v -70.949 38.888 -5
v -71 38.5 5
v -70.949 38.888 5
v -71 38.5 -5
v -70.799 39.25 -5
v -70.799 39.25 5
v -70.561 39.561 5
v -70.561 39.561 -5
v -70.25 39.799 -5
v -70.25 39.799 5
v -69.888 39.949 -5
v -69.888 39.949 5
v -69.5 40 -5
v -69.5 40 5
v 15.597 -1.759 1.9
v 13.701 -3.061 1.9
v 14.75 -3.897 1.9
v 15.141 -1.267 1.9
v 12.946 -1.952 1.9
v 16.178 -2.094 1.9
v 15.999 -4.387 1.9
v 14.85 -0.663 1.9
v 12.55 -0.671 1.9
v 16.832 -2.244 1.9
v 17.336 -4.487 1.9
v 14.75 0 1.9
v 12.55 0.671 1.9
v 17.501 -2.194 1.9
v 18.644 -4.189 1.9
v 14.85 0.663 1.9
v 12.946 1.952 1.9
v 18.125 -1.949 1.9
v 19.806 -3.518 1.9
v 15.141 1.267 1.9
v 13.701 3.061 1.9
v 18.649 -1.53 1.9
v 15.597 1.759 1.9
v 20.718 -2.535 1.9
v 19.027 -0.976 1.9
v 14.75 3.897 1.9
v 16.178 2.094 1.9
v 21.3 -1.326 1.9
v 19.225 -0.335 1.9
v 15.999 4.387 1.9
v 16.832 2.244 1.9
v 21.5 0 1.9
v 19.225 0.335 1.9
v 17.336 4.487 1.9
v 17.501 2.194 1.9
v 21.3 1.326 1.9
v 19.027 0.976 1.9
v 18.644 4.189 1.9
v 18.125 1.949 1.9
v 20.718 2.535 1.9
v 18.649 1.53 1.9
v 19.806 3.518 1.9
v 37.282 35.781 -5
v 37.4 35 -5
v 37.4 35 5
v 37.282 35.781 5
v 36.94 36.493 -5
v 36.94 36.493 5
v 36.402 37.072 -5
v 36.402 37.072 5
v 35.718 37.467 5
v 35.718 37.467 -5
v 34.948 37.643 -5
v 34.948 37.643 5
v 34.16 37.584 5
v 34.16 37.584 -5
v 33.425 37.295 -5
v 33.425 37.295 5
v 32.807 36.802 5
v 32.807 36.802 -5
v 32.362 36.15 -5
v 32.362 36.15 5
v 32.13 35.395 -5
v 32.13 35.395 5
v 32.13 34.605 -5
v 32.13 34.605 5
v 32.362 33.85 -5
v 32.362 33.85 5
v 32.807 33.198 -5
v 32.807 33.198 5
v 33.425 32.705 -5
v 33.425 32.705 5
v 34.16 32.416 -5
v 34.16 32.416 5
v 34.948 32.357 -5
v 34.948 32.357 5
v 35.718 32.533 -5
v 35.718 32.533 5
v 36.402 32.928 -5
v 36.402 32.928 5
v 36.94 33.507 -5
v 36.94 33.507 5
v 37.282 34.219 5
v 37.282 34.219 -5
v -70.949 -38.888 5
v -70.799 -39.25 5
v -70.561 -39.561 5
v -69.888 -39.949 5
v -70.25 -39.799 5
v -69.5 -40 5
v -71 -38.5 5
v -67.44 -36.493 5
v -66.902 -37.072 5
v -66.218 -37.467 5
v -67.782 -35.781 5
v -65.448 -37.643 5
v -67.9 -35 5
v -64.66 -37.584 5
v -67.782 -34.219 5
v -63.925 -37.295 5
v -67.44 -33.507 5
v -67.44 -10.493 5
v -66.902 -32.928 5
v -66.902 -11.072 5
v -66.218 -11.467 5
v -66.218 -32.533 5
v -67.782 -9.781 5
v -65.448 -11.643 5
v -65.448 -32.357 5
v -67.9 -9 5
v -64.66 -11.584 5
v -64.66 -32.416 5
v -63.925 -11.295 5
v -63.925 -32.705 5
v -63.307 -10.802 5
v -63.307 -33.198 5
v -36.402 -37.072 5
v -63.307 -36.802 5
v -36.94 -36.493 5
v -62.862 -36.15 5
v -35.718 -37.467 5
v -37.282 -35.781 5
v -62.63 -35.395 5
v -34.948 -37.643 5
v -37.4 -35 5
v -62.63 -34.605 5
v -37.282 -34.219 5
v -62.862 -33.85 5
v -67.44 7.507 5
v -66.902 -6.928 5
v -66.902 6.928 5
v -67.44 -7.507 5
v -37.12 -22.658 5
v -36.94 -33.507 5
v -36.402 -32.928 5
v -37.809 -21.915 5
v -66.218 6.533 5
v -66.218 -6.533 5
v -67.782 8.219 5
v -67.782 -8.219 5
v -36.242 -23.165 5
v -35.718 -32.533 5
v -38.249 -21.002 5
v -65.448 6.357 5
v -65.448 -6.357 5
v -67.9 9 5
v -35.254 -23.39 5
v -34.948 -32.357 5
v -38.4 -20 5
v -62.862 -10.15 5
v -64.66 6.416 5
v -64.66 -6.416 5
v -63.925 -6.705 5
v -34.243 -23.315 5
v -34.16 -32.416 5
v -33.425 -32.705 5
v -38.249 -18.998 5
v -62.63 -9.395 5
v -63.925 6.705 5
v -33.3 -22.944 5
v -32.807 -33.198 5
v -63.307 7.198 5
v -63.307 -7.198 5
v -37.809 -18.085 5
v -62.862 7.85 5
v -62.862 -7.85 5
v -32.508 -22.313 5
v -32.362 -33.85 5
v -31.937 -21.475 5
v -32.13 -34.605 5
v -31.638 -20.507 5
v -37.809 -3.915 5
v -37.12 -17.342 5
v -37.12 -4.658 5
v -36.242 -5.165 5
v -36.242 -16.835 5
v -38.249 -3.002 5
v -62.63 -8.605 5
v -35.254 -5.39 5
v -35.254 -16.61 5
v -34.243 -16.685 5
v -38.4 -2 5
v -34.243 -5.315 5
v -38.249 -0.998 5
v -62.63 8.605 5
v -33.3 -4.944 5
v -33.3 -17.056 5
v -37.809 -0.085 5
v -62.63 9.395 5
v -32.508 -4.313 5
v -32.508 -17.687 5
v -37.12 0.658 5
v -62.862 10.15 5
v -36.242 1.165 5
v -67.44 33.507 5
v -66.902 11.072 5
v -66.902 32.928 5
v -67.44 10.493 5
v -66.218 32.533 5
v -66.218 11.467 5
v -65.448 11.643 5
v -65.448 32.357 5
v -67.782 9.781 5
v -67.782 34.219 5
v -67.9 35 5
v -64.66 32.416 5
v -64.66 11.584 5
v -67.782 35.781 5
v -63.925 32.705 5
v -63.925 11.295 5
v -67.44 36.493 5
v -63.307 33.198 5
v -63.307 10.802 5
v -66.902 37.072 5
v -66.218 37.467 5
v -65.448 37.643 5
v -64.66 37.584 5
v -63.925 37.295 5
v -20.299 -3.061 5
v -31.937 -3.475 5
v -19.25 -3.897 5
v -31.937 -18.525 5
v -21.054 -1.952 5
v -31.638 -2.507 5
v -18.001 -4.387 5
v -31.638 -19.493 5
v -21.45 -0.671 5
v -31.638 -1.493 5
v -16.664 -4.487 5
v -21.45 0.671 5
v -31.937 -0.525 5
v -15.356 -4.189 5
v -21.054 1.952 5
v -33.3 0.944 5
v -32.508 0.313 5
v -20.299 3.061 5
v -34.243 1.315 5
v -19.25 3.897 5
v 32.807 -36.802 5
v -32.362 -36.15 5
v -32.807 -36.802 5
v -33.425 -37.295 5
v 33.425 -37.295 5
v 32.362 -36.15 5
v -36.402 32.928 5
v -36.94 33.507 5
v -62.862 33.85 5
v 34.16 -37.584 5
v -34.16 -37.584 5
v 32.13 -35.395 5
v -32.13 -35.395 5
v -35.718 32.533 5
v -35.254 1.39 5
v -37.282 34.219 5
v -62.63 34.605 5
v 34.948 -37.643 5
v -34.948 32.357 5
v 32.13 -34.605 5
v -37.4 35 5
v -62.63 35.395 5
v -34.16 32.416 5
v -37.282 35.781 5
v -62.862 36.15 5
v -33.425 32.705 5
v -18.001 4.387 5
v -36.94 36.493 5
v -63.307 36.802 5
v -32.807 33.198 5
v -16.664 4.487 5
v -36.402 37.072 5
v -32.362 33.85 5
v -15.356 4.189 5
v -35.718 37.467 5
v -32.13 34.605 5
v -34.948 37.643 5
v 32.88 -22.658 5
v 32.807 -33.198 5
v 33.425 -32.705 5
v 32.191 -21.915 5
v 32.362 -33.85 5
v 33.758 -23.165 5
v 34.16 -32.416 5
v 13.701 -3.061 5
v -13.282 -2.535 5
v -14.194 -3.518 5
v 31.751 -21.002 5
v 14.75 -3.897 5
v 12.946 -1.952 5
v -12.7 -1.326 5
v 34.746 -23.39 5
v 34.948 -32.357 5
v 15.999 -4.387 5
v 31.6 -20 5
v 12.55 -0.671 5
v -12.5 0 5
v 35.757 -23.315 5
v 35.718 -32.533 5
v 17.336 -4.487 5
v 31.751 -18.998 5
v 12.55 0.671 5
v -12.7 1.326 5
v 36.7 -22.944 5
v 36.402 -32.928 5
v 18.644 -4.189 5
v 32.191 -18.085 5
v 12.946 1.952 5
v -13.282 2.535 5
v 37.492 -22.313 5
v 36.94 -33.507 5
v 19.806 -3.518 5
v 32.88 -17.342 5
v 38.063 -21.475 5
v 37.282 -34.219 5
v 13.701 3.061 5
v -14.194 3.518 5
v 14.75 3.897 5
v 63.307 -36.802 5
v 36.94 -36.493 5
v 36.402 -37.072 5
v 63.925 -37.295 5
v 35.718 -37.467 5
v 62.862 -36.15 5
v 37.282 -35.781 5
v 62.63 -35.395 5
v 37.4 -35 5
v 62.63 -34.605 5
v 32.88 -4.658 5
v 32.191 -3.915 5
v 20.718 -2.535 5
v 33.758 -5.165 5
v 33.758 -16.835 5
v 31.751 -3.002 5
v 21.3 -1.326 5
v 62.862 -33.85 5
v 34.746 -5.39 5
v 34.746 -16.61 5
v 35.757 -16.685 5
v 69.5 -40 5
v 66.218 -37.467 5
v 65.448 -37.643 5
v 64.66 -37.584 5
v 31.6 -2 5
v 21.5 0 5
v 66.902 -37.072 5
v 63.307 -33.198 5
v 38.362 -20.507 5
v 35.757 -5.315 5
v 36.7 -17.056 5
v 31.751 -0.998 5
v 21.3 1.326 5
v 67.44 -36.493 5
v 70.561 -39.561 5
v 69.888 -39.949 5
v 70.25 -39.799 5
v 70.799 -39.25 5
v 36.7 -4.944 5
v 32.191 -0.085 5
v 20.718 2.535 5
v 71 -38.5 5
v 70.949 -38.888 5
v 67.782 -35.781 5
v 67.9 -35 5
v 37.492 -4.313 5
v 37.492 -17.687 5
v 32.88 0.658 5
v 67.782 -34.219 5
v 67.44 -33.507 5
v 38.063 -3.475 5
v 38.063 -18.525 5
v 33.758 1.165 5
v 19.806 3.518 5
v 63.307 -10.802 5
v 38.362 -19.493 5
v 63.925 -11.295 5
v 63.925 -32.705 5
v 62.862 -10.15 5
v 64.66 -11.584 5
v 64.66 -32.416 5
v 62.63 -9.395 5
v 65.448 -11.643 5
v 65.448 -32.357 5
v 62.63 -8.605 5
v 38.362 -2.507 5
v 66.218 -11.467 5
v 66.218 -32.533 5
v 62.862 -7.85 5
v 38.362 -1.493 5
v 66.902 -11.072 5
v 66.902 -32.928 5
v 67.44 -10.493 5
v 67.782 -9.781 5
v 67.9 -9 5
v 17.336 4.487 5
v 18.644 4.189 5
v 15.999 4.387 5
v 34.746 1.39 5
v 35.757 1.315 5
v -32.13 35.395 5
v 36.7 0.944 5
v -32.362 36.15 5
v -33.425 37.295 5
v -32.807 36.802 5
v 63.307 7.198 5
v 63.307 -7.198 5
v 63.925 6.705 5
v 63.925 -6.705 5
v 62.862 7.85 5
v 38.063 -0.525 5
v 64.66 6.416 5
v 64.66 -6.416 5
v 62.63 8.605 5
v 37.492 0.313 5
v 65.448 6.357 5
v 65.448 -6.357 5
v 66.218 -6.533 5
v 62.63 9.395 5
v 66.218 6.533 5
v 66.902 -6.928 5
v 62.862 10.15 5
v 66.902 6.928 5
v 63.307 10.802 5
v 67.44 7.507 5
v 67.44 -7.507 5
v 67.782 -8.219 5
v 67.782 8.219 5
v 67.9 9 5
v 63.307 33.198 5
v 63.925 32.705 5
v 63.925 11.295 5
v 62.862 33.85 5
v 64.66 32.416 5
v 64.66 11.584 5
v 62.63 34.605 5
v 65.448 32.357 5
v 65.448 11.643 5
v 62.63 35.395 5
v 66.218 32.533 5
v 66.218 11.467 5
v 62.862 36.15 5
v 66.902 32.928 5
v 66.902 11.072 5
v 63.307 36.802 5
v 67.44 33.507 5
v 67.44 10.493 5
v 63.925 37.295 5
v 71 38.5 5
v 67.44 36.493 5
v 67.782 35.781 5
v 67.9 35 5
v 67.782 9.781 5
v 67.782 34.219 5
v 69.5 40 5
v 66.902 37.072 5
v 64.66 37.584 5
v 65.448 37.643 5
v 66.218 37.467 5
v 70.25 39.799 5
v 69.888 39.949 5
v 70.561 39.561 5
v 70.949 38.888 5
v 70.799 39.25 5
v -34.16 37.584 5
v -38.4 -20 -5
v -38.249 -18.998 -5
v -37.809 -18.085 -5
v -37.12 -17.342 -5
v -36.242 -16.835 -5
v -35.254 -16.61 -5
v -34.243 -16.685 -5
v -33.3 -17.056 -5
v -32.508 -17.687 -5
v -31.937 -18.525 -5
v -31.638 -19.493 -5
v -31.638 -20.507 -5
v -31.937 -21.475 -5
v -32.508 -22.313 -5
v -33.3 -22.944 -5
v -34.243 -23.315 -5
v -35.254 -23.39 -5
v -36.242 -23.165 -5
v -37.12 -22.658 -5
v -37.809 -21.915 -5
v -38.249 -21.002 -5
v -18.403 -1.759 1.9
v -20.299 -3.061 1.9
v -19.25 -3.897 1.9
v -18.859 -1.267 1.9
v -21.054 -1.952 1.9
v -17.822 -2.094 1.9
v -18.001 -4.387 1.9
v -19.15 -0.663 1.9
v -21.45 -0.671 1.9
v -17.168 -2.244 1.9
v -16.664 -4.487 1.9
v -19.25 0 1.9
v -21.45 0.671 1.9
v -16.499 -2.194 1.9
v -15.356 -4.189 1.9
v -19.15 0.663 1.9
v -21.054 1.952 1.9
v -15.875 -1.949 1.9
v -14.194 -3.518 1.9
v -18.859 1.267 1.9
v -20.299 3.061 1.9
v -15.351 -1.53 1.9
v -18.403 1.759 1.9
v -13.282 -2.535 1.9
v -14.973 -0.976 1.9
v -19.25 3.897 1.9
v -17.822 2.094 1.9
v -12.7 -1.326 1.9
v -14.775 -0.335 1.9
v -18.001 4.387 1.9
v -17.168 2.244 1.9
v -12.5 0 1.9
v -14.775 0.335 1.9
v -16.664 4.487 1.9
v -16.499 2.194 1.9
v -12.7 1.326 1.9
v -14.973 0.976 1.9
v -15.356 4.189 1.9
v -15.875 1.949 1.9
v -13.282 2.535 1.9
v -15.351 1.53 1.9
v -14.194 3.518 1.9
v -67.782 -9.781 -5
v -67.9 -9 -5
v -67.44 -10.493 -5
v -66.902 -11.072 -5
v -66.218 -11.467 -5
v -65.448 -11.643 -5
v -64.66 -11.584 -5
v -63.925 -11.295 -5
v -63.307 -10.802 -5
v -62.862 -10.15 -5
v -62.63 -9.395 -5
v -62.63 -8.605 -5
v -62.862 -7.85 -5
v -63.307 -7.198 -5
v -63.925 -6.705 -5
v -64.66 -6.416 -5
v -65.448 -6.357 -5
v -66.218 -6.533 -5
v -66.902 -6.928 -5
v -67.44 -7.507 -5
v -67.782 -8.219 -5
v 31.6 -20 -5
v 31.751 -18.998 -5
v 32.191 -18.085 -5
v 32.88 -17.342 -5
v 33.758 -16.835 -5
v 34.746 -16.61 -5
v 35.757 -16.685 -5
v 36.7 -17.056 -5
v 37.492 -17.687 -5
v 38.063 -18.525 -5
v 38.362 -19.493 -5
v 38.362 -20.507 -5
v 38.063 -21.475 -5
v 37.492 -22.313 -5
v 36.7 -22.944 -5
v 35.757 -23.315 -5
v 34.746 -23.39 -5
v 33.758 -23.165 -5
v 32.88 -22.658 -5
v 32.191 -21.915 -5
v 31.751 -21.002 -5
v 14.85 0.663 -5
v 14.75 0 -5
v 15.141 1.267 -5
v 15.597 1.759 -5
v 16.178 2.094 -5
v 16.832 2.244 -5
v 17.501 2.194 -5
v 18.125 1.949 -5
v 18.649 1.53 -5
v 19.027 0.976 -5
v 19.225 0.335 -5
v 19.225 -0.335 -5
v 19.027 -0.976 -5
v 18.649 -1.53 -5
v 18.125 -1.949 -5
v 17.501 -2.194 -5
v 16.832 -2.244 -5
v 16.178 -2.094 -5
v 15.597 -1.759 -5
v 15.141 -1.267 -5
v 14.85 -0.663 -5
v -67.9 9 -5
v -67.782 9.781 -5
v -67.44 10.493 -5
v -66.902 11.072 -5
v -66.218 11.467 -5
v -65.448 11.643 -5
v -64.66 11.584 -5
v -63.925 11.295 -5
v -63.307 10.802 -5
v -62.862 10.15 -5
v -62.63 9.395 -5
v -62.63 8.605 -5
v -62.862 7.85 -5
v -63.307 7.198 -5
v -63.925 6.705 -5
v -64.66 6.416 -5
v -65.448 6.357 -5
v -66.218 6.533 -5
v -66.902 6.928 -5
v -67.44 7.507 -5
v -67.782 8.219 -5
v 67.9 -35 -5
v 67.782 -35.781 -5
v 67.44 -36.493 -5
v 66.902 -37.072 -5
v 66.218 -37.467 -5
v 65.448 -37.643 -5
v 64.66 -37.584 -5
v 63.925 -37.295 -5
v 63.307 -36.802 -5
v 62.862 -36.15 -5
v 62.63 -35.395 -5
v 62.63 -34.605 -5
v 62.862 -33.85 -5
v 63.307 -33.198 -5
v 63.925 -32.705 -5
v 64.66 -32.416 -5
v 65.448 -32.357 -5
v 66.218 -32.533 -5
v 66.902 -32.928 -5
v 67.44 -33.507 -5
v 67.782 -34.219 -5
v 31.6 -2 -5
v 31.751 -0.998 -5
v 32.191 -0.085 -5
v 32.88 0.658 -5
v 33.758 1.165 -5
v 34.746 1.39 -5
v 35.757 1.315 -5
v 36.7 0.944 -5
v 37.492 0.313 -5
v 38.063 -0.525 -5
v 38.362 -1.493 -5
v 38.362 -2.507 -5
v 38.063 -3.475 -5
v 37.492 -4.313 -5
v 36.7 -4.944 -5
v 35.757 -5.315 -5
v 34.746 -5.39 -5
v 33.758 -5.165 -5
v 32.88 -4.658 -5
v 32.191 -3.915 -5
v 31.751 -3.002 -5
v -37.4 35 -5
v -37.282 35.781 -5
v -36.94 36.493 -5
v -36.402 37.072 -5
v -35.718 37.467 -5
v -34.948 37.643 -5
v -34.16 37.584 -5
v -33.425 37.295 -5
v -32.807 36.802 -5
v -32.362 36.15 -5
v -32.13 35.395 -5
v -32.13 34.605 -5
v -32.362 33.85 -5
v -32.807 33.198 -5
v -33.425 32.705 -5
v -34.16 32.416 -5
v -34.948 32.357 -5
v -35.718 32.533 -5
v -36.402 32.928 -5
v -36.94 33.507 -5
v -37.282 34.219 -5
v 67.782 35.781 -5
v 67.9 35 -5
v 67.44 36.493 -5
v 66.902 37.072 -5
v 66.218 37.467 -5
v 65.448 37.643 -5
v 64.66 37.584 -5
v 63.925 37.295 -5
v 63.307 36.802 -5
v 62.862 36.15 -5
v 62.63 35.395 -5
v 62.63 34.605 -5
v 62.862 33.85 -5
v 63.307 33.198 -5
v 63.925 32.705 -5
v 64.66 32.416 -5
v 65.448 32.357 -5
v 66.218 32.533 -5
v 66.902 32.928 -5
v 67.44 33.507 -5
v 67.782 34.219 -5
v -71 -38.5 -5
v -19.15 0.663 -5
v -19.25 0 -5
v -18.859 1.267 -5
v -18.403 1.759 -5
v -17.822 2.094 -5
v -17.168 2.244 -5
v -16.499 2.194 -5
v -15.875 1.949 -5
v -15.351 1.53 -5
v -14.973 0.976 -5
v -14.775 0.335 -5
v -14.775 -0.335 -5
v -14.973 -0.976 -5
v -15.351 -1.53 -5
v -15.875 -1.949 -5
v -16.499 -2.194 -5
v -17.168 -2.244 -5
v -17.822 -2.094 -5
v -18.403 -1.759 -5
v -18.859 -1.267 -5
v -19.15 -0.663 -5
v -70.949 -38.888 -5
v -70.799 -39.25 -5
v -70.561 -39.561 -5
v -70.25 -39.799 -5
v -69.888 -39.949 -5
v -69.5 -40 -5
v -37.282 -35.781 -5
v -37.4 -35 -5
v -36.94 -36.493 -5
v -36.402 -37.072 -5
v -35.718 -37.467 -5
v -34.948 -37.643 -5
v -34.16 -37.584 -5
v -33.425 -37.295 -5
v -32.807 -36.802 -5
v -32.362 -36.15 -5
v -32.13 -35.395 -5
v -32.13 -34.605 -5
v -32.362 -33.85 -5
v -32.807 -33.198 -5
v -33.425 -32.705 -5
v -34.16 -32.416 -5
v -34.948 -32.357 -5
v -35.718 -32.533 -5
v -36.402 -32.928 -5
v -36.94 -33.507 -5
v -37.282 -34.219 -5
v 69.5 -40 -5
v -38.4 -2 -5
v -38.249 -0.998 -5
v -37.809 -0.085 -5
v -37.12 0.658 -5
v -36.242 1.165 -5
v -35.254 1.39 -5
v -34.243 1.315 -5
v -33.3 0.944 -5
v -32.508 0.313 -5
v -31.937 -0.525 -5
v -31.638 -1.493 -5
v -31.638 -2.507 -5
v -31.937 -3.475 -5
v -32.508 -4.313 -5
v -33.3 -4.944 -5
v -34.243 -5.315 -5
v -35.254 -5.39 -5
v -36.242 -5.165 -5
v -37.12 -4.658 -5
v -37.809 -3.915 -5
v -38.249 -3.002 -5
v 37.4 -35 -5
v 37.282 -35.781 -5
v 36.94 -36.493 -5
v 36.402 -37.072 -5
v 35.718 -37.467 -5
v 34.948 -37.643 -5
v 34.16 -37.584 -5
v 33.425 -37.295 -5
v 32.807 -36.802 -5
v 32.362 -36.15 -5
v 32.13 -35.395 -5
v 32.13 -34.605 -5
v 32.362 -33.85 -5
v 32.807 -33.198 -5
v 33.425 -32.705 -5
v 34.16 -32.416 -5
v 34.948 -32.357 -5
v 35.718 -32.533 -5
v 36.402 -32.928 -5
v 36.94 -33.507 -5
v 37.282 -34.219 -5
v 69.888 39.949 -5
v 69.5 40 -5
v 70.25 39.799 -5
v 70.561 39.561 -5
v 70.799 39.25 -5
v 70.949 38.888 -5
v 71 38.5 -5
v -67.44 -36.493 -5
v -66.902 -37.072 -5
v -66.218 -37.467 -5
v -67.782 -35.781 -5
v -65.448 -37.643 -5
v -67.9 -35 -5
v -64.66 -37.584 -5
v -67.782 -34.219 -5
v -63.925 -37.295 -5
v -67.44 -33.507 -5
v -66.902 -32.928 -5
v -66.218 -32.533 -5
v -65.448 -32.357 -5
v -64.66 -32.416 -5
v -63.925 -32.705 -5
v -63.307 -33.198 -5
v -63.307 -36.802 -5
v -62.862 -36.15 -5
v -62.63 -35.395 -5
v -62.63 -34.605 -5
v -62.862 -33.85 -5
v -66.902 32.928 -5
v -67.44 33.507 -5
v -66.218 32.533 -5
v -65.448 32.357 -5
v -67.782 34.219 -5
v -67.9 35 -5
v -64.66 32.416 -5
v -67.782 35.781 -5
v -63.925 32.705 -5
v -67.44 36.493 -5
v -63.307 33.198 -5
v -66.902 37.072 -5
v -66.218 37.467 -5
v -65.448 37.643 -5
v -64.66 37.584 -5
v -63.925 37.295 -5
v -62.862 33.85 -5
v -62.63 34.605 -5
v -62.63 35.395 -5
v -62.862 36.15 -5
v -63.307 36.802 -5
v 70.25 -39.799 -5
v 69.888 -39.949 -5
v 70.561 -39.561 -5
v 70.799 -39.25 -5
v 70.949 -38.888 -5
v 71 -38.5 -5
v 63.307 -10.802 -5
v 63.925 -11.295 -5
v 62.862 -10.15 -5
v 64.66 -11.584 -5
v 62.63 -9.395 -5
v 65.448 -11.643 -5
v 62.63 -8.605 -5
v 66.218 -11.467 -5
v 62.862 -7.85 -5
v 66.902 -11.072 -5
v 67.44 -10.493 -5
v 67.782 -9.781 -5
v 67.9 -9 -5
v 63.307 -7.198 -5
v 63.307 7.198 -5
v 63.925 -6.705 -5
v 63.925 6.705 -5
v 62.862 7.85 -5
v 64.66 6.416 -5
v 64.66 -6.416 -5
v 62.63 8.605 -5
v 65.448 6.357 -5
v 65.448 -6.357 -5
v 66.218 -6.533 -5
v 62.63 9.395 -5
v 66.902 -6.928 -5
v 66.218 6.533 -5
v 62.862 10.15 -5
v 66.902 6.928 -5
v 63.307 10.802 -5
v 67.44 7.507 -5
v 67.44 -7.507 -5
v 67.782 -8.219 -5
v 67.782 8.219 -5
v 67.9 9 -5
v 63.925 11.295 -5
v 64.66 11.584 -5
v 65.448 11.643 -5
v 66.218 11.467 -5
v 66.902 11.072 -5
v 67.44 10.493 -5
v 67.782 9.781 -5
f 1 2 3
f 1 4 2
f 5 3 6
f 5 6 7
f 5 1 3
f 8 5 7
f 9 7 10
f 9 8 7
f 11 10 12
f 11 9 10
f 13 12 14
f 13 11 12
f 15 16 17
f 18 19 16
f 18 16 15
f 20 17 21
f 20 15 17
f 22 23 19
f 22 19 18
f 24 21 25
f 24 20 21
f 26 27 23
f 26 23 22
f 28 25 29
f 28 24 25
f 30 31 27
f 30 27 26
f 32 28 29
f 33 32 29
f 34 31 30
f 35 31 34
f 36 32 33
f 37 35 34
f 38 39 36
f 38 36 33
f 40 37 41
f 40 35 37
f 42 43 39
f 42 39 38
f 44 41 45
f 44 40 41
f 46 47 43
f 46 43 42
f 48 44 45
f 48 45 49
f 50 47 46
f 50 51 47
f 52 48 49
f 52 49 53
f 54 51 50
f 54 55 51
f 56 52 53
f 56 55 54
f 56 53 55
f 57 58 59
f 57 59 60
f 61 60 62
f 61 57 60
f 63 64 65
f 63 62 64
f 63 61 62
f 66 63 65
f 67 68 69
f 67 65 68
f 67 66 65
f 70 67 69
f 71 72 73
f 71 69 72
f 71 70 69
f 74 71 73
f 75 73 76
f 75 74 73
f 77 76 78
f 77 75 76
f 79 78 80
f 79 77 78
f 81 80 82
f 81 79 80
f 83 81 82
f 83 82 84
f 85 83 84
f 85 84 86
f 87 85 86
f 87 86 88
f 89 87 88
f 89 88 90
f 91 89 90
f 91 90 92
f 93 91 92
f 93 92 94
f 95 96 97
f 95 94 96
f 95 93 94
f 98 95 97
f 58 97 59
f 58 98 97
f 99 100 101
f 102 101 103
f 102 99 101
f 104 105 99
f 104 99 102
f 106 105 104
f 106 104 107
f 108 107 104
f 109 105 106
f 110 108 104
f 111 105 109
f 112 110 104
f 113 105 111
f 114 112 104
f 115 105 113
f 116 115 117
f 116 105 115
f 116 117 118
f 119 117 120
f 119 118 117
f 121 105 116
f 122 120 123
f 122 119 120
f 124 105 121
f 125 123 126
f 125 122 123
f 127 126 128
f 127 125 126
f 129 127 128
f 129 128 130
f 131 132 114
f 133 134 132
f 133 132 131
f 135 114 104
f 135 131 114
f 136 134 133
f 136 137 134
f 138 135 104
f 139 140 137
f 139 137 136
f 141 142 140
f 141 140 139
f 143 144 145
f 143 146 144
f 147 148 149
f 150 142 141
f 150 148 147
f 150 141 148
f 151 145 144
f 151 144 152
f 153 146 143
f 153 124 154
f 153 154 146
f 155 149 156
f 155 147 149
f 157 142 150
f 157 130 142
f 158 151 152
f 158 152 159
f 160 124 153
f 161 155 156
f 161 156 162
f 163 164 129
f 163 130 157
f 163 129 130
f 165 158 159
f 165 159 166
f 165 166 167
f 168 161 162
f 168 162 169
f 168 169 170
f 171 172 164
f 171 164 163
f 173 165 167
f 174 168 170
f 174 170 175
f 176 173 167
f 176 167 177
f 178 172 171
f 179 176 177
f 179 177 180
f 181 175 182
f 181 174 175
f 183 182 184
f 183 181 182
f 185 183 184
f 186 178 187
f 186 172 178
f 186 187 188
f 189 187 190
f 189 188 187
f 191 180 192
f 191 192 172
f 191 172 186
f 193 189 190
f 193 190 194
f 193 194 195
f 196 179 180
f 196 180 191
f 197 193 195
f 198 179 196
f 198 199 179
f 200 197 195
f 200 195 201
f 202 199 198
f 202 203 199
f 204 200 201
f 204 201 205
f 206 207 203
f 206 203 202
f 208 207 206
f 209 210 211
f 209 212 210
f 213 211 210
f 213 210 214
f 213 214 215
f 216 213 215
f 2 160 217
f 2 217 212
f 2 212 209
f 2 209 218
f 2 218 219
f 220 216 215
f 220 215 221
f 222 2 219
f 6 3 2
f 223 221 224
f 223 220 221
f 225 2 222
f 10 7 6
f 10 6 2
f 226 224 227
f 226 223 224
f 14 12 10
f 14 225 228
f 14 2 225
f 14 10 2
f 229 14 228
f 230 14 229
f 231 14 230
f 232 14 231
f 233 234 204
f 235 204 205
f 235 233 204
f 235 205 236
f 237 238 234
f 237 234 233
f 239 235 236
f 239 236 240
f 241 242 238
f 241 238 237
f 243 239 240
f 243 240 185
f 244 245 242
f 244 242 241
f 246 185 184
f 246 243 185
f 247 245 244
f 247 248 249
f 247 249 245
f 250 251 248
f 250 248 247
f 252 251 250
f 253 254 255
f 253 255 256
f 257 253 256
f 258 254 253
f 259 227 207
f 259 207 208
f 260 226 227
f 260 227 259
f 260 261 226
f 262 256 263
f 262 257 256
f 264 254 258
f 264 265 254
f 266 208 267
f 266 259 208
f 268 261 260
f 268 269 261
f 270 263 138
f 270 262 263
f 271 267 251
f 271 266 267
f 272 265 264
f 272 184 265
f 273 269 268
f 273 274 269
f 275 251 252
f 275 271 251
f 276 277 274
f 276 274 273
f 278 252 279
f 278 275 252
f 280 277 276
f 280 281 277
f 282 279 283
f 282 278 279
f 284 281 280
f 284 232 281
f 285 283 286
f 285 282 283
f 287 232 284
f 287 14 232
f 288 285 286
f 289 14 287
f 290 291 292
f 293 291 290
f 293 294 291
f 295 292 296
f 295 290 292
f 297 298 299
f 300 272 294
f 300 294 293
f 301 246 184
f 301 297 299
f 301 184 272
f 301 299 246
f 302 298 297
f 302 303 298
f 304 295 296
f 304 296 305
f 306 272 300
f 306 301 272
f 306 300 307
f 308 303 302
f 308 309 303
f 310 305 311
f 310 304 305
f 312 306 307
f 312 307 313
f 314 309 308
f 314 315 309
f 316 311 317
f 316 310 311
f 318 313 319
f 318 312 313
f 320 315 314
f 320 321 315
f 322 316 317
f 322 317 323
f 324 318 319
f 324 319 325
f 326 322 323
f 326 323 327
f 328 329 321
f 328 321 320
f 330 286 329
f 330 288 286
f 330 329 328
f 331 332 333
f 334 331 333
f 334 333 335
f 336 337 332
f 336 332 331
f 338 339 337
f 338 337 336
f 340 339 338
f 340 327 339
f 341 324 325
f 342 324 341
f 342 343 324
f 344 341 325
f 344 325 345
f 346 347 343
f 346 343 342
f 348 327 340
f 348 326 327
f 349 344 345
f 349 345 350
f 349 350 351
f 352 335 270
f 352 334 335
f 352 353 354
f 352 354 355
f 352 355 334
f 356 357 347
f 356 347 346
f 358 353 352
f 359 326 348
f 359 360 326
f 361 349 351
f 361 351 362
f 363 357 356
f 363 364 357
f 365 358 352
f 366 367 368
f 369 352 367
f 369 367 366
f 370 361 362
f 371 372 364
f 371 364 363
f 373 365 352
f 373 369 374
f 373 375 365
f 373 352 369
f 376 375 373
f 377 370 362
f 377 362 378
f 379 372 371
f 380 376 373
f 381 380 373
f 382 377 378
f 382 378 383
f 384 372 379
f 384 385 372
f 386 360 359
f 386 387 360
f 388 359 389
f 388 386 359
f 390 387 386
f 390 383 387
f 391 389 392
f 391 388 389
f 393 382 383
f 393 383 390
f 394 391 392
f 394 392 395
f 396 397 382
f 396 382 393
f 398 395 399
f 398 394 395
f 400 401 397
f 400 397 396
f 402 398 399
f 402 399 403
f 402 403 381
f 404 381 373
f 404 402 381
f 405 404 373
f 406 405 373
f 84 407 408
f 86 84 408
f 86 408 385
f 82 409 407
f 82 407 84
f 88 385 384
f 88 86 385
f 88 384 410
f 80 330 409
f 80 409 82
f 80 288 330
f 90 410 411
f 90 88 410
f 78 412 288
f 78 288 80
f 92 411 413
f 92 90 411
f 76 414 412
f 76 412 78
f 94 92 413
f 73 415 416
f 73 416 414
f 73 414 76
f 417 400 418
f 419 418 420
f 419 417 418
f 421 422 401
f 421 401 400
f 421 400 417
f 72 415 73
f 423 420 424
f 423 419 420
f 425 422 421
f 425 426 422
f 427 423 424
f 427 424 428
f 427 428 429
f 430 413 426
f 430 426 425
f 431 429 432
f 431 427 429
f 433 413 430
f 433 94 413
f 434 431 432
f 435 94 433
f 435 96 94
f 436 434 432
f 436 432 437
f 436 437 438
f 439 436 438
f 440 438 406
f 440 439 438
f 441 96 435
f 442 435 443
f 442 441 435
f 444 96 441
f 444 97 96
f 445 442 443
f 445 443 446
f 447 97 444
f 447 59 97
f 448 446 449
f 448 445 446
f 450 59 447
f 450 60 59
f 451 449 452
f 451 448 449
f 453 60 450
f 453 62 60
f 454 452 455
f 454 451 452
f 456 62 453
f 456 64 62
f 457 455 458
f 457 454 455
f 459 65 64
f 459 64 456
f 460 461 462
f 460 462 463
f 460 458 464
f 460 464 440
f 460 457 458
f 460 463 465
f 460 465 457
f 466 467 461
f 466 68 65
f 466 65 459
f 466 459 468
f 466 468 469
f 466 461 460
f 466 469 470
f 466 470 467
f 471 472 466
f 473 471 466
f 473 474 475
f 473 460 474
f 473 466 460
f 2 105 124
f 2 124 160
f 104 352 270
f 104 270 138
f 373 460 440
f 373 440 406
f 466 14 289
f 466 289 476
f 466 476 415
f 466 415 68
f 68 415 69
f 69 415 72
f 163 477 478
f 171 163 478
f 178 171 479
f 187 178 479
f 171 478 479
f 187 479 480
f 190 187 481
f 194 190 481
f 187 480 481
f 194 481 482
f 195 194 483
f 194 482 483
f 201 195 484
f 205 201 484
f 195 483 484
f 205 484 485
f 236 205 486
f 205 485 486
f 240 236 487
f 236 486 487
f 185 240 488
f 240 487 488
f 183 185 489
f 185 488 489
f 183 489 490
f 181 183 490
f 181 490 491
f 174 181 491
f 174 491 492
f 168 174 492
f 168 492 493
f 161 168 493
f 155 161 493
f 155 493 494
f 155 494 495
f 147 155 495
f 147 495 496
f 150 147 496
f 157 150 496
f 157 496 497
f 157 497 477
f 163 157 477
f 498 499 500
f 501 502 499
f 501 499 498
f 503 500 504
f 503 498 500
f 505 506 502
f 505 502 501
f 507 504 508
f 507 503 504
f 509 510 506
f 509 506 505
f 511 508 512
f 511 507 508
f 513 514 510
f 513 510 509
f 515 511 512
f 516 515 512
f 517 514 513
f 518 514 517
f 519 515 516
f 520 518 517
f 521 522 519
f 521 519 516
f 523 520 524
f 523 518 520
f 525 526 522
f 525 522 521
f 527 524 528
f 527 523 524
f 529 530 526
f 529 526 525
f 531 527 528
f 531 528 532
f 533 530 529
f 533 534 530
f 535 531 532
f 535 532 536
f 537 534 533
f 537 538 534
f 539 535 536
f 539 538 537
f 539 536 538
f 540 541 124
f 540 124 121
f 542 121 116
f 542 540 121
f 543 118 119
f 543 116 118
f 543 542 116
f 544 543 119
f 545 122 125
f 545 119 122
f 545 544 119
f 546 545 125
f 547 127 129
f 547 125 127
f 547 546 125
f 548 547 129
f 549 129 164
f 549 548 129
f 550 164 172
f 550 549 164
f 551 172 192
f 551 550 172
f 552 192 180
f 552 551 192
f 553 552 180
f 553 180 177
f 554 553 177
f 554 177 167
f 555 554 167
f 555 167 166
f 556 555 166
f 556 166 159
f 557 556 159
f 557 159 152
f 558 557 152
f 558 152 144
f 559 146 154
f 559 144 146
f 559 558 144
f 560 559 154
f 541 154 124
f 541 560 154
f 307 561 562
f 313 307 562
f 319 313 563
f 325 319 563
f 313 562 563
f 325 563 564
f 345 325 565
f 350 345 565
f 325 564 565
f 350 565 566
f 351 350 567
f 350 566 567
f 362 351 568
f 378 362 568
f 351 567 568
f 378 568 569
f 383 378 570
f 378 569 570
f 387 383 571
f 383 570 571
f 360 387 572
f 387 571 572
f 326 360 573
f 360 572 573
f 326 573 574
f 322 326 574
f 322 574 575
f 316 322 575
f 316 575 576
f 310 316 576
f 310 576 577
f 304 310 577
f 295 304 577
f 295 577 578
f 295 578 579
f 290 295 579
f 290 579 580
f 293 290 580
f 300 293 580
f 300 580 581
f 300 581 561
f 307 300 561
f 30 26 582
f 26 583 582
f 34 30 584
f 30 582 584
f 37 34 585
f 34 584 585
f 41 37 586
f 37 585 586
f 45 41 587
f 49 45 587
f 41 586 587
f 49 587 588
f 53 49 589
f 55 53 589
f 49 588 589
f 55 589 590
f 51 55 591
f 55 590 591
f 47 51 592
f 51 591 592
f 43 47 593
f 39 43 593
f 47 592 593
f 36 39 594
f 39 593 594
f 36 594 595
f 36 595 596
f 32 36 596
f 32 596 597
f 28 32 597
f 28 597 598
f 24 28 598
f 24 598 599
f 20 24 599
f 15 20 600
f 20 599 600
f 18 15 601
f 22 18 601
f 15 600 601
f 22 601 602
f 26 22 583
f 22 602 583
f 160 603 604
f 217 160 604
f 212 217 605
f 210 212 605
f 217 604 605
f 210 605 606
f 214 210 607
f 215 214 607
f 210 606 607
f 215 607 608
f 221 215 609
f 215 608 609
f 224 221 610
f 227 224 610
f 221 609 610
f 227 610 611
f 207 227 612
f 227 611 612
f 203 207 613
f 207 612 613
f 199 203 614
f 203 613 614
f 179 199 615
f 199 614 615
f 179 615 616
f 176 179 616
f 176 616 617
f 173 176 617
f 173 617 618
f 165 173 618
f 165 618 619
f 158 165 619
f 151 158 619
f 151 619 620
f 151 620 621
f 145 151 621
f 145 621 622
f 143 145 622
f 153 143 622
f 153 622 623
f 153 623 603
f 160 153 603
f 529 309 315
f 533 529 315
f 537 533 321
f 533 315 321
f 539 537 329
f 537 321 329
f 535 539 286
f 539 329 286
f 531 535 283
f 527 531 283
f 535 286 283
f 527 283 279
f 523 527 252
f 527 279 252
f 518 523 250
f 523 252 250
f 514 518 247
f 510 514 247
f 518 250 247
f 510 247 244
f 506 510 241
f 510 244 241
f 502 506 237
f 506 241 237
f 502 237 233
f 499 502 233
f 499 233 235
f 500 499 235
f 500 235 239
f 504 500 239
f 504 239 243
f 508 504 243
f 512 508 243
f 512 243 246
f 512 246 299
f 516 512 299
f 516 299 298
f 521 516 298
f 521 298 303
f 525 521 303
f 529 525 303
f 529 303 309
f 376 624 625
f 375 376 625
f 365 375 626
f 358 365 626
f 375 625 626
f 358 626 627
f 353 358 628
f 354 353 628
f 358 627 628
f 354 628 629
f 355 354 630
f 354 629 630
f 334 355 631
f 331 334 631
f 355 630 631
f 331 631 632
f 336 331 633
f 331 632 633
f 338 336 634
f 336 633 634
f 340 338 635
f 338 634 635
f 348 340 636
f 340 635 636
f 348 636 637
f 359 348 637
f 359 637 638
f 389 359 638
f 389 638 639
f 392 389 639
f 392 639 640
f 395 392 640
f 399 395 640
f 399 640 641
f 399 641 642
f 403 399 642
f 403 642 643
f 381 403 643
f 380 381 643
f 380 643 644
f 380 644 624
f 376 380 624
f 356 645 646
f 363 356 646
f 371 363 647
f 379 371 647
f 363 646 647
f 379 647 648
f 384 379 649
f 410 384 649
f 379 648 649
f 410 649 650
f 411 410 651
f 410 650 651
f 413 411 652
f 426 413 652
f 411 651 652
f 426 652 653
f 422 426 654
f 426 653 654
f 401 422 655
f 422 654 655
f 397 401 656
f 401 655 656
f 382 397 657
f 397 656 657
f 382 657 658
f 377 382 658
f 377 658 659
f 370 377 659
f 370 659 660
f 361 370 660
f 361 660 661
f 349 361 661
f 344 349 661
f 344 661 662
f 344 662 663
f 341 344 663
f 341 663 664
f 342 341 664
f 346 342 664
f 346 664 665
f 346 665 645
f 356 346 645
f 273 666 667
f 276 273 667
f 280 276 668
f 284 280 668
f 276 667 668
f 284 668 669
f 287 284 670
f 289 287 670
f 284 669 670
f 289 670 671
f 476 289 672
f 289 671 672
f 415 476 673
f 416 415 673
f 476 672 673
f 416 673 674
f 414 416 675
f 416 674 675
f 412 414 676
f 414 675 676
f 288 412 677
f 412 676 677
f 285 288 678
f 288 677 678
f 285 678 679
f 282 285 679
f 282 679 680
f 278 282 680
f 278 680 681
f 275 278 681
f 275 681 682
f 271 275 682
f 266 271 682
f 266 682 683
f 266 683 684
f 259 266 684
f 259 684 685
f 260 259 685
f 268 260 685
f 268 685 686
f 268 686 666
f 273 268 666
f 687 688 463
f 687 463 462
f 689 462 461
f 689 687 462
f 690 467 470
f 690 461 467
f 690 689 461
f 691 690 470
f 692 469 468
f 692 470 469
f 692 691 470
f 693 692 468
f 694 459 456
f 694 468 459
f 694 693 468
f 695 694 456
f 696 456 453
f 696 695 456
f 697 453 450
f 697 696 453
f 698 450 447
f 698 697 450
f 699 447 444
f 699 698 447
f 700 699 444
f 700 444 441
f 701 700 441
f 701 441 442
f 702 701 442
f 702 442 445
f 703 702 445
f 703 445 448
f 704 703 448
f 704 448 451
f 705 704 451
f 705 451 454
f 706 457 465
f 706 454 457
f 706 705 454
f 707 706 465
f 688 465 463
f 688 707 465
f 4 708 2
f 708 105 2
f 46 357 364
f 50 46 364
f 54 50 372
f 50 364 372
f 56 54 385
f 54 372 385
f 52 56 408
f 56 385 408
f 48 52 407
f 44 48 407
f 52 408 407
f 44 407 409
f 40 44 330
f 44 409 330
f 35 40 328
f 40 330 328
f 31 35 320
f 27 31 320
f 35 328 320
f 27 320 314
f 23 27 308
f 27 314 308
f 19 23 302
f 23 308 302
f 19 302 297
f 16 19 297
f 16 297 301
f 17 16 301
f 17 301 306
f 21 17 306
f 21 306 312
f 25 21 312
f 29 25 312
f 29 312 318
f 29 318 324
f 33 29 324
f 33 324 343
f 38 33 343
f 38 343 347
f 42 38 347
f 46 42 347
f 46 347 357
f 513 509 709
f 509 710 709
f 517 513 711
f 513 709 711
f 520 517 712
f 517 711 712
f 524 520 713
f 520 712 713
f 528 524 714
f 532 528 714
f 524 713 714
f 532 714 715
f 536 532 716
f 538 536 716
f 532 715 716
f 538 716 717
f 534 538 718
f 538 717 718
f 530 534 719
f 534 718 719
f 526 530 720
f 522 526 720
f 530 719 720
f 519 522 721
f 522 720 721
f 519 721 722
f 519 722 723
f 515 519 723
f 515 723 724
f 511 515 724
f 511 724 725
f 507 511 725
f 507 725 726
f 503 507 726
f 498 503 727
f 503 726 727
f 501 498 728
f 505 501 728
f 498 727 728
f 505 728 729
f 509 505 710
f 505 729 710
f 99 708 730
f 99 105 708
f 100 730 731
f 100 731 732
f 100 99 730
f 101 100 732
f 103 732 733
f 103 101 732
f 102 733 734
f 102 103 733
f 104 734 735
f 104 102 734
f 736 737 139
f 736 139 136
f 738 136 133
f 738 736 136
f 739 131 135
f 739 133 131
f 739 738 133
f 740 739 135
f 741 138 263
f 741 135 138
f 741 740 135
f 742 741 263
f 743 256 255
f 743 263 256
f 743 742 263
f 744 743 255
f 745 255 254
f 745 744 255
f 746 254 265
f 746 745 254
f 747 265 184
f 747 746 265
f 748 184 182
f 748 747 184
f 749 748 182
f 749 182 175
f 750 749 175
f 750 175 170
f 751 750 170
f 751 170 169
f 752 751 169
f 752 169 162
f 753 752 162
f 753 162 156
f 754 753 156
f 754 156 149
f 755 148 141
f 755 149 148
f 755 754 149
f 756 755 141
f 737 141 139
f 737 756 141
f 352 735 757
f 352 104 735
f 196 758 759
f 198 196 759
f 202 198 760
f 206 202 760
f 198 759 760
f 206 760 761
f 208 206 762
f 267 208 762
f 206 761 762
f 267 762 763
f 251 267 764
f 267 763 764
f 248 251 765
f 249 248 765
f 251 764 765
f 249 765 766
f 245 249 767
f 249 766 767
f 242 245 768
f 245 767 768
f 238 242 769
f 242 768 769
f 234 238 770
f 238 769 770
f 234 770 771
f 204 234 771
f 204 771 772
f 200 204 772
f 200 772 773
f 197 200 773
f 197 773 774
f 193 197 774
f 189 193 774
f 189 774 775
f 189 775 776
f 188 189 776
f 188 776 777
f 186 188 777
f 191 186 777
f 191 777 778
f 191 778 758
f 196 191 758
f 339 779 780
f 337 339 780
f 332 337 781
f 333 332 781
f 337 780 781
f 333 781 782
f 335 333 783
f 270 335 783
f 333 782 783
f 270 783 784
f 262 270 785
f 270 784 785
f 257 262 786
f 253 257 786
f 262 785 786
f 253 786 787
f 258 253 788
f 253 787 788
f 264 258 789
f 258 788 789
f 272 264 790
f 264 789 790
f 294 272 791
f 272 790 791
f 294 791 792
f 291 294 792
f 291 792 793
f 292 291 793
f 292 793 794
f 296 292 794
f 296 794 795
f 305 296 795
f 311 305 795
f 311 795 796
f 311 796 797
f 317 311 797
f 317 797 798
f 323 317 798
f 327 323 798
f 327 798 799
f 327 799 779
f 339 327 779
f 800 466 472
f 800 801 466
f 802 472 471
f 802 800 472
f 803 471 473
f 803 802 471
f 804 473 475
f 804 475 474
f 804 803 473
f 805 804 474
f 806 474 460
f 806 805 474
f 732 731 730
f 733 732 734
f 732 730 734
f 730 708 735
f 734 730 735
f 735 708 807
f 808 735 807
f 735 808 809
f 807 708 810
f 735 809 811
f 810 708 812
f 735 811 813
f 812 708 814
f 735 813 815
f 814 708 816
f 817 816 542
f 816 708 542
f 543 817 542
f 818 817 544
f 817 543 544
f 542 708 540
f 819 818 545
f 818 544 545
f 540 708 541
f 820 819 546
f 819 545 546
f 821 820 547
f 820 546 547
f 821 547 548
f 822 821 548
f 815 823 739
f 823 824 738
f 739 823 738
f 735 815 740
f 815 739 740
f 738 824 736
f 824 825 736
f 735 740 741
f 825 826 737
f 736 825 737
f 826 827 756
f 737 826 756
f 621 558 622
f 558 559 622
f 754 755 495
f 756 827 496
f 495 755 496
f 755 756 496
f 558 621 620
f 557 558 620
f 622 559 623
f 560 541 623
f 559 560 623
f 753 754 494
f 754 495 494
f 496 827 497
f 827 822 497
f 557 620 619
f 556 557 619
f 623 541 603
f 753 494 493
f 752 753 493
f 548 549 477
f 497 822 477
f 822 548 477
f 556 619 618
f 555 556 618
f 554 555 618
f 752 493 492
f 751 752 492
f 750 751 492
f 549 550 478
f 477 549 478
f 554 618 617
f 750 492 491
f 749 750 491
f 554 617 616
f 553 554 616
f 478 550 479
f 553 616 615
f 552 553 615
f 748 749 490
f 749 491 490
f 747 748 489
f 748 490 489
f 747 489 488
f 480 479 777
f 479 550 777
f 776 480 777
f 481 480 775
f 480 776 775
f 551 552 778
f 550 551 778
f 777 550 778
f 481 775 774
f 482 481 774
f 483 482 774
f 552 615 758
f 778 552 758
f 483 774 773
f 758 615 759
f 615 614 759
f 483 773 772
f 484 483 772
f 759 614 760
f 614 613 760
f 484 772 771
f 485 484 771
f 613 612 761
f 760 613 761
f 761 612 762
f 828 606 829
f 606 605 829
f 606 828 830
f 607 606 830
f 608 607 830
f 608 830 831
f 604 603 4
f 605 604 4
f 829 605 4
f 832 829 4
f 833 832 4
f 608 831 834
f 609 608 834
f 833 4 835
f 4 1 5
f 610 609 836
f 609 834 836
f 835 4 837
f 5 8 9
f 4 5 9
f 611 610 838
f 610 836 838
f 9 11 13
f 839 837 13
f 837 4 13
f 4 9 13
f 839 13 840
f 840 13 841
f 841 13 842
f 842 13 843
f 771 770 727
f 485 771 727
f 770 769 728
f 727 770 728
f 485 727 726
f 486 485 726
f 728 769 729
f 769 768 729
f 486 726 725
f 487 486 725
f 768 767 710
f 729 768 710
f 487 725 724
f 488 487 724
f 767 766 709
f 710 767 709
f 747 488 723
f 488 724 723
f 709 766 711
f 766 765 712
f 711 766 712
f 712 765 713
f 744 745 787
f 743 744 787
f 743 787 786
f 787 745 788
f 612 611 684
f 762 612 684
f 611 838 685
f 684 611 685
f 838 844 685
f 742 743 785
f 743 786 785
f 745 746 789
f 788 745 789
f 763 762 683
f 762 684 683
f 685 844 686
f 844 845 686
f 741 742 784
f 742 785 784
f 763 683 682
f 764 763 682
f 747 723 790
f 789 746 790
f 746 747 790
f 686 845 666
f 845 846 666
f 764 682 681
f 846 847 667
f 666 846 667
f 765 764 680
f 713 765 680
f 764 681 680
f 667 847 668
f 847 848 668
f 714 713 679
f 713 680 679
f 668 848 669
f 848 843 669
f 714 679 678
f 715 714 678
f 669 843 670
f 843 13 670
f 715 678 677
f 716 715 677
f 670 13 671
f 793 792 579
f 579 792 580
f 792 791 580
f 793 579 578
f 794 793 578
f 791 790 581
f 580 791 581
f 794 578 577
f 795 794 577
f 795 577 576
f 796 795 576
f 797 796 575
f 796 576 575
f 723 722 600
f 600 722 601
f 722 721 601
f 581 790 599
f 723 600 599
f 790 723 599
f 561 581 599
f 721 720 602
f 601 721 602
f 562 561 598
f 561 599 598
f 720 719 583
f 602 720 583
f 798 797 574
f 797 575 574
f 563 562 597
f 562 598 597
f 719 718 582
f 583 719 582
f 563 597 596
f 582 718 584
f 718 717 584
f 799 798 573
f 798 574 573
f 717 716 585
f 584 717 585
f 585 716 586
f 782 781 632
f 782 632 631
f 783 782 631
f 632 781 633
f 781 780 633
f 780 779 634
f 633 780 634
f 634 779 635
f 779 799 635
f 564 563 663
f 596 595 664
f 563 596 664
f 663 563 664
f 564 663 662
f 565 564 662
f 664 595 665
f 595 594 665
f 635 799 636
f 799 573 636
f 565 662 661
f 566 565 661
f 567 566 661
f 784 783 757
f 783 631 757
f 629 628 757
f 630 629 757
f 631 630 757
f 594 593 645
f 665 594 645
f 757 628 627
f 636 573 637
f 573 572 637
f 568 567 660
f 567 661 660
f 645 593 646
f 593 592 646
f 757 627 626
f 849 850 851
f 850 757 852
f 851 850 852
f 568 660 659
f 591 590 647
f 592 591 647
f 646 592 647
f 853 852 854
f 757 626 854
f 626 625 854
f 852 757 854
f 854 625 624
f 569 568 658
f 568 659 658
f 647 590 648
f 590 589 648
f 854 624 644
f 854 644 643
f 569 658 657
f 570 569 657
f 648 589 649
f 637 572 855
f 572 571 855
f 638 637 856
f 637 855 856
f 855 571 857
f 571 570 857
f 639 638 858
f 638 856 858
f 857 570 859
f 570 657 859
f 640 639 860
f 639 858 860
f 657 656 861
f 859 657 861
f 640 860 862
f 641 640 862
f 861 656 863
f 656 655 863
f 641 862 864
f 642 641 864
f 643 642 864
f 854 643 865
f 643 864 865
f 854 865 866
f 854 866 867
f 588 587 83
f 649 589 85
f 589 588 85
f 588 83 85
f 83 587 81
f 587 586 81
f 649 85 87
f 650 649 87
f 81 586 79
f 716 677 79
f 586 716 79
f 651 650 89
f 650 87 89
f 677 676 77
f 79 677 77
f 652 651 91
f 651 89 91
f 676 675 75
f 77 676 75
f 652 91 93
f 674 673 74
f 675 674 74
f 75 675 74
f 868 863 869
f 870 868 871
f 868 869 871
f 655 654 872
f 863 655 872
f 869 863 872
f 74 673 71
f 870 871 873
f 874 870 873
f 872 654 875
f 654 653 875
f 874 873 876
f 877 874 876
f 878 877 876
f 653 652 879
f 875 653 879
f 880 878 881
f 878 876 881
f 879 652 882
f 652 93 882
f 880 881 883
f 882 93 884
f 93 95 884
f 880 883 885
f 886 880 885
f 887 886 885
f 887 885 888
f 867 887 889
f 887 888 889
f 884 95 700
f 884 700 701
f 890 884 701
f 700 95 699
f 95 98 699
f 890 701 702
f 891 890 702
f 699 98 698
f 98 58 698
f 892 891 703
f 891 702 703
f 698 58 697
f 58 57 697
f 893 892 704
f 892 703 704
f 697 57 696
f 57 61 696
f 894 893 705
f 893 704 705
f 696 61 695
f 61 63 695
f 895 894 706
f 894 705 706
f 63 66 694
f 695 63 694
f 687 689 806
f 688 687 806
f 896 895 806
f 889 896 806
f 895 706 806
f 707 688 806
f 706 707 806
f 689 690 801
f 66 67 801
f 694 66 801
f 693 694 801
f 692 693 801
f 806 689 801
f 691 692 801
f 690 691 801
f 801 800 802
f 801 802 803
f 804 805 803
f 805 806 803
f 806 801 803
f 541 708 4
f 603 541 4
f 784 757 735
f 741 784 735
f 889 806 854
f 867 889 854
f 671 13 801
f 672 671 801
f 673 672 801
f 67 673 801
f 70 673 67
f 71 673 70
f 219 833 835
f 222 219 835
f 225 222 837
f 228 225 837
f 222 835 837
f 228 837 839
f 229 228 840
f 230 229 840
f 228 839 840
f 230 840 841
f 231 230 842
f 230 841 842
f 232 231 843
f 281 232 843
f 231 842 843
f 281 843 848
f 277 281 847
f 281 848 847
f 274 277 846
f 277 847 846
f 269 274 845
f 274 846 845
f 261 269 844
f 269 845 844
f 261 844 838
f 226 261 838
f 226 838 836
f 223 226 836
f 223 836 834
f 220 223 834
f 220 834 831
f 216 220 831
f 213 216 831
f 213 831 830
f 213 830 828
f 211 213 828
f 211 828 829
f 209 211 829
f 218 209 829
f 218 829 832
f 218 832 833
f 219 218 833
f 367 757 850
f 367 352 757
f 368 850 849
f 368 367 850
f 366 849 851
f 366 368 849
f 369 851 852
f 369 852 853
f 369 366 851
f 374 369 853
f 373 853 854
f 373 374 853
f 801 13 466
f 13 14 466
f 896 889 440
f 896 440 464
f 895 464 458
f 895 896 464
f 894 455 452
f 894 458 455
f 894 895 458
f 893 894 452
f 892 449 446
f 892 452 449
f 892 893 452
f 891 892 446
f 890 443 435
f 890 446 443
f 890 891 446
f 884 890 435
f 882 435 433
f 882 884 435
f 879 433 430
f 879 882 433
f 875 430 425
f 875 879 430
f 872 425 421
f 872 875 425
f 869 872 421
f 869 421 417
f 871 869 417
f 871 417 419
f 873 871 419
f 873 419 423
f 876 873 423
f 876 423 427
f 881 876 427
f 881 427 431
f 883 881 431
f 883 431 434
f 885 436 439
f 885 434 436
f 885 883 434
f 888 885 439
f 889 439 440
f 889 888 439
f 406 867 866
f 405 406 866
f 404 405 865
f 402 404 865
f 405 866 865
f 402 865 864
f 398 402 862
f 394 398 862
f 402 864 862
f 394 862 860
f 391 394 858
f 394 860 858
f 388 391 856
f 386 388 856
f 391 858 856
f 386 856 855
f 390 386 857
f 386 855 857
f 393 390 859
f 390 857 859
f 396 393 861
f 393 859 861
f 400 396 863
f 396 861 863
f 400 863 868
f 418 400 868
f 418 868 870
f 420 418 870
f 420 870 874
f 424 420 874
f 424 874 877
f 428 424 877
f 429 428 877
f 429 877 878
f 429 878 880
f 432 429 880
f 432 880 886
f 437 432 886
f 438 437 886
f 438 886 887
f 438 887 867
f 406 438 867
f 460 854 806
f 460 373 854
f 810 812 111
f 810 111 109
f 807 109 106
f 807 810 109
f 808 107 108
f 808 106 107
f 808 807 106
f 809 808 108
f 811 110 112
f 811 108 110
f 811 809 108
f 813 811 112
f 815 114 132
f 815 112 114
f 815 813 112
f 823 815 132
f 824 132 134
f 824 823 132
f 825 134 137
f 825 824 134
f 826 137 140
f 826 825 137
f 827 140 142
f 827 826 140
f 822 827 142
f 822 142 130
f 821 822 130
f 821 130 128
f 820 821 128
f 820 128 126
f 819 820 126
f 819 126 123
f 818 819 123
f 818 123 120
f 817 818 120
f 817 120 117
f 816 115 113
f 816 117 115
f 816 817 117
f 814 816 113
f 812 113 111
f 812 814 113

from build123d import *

# Parameters (mm, degrees)
SKETCH1_W                                        = 142
SKETCH1_H                                        = 80
BOSS_EXTRUDE1_DEPTH                              = 5
M5_CLEARANCE_HOLE1_D                             = 5.3
MIRROR2_COPY_1_D                                 = 5.3
CBORE_FOR_M4_PAN_HEAD_MACHINE_SCREW1_D           = 4.5
CBORE_FOR_M4_PAN_HEAD_MACHINE_SCREW1_CBORE_D     = 9
CBORE_FOR_M4_PAN_HEAD_MACHINE_SCREW1_CBORE_DEPTH = 3.1
M8X1_25_TAPPED_HOLE1_D                           = 6.8
FILLET1_R                                        = 1.5


with BuildPart() as part:
    # Sketch1 → Boss-Extrude1 (new body, symmetric)
    with BuildSketch(Plane.XY):
        Rectangle(SKETCH1_W, SKETCH1_H)
    extrude(amount=BOSS_EXTRUDE1_DEPTH, both=True)

    # M5 Clearance Hole1 (through all)
    with Locations(Plane.XY.offset(5)):
        with Locations((-65.25, 35), (-34.75, 35), (-65.25, 9)):
            m5_clearance_hole1 = Hole(M5_CLEARANCE_HOLE1_D / 2)

    # Mirror1: M5 Clearance Hole1 across plane
    add(m5_clearance_hole1.mirror(Plane(origin=(0, 0, 0), x_dir=(0, 0, 1), z_dir=(1, 0, 0))), mode=Mode.SUBTRACT)

    # Mirror2: M5 Clearance Hole1 across plane
    add(m5_clearance_hole1.mirror(Plane.ZX), mode=Mode.SUBTRACT)

    # Mirror2 copy 1 (through all)
    with Locations(Plane(origin=(0, 0, 5), x_dir=(-1, 0, 0), z_dir=(0, 0, 1))):
        with Locations((-65.25, 35), (-34.75, 35), (-65.25, 9)):
            Hole(MIRROR2_COPY_1_D / 2)

    # CBORE for M4 Pan Head Machine Screw1 (through all)
    with Locations(Plane(origin=(-50.308370618, 7.533390419, 5), x_dir=(1, 0, 0), z_dir=(0, 0, 1))):
        with Locations((33.308370618, -7.533390419), (67.308370618, -7.533390419)):
            CounterBoreHole(CBORE_FOR_M4_PAN_HEAD_MACHINE_SCREW1_D / 2, CBORE_FOR_M4_PAN_HEAD_MACHINE_SCREW1_CBORE_D / 2, CBORE_FOR_M4_PAN_HEAD_MACHINE_SCREW1_CBORE_DEPTH)

    # M8x1.25 Tapped Hole1 (through all)
    with Locations(Plane.XY.offset(5)):
        with Locations((-35, -2), (35, -2), (35, -20), (-35, -20)):
            Hole(M8X1_25_TAPPED_HOLE1_D / 2)

    # Fillet1
    fillet1_edges = [part.edges().sort_by_distance(p)[0] for p in [
        (71, -40, 0),
        (-71, -40, 0),
        (-71, 40, 0),
        (71, 40, 0),
    ]]
    fillet(fillet1_edges, radius=FILLET1_R)


solid = part.part
